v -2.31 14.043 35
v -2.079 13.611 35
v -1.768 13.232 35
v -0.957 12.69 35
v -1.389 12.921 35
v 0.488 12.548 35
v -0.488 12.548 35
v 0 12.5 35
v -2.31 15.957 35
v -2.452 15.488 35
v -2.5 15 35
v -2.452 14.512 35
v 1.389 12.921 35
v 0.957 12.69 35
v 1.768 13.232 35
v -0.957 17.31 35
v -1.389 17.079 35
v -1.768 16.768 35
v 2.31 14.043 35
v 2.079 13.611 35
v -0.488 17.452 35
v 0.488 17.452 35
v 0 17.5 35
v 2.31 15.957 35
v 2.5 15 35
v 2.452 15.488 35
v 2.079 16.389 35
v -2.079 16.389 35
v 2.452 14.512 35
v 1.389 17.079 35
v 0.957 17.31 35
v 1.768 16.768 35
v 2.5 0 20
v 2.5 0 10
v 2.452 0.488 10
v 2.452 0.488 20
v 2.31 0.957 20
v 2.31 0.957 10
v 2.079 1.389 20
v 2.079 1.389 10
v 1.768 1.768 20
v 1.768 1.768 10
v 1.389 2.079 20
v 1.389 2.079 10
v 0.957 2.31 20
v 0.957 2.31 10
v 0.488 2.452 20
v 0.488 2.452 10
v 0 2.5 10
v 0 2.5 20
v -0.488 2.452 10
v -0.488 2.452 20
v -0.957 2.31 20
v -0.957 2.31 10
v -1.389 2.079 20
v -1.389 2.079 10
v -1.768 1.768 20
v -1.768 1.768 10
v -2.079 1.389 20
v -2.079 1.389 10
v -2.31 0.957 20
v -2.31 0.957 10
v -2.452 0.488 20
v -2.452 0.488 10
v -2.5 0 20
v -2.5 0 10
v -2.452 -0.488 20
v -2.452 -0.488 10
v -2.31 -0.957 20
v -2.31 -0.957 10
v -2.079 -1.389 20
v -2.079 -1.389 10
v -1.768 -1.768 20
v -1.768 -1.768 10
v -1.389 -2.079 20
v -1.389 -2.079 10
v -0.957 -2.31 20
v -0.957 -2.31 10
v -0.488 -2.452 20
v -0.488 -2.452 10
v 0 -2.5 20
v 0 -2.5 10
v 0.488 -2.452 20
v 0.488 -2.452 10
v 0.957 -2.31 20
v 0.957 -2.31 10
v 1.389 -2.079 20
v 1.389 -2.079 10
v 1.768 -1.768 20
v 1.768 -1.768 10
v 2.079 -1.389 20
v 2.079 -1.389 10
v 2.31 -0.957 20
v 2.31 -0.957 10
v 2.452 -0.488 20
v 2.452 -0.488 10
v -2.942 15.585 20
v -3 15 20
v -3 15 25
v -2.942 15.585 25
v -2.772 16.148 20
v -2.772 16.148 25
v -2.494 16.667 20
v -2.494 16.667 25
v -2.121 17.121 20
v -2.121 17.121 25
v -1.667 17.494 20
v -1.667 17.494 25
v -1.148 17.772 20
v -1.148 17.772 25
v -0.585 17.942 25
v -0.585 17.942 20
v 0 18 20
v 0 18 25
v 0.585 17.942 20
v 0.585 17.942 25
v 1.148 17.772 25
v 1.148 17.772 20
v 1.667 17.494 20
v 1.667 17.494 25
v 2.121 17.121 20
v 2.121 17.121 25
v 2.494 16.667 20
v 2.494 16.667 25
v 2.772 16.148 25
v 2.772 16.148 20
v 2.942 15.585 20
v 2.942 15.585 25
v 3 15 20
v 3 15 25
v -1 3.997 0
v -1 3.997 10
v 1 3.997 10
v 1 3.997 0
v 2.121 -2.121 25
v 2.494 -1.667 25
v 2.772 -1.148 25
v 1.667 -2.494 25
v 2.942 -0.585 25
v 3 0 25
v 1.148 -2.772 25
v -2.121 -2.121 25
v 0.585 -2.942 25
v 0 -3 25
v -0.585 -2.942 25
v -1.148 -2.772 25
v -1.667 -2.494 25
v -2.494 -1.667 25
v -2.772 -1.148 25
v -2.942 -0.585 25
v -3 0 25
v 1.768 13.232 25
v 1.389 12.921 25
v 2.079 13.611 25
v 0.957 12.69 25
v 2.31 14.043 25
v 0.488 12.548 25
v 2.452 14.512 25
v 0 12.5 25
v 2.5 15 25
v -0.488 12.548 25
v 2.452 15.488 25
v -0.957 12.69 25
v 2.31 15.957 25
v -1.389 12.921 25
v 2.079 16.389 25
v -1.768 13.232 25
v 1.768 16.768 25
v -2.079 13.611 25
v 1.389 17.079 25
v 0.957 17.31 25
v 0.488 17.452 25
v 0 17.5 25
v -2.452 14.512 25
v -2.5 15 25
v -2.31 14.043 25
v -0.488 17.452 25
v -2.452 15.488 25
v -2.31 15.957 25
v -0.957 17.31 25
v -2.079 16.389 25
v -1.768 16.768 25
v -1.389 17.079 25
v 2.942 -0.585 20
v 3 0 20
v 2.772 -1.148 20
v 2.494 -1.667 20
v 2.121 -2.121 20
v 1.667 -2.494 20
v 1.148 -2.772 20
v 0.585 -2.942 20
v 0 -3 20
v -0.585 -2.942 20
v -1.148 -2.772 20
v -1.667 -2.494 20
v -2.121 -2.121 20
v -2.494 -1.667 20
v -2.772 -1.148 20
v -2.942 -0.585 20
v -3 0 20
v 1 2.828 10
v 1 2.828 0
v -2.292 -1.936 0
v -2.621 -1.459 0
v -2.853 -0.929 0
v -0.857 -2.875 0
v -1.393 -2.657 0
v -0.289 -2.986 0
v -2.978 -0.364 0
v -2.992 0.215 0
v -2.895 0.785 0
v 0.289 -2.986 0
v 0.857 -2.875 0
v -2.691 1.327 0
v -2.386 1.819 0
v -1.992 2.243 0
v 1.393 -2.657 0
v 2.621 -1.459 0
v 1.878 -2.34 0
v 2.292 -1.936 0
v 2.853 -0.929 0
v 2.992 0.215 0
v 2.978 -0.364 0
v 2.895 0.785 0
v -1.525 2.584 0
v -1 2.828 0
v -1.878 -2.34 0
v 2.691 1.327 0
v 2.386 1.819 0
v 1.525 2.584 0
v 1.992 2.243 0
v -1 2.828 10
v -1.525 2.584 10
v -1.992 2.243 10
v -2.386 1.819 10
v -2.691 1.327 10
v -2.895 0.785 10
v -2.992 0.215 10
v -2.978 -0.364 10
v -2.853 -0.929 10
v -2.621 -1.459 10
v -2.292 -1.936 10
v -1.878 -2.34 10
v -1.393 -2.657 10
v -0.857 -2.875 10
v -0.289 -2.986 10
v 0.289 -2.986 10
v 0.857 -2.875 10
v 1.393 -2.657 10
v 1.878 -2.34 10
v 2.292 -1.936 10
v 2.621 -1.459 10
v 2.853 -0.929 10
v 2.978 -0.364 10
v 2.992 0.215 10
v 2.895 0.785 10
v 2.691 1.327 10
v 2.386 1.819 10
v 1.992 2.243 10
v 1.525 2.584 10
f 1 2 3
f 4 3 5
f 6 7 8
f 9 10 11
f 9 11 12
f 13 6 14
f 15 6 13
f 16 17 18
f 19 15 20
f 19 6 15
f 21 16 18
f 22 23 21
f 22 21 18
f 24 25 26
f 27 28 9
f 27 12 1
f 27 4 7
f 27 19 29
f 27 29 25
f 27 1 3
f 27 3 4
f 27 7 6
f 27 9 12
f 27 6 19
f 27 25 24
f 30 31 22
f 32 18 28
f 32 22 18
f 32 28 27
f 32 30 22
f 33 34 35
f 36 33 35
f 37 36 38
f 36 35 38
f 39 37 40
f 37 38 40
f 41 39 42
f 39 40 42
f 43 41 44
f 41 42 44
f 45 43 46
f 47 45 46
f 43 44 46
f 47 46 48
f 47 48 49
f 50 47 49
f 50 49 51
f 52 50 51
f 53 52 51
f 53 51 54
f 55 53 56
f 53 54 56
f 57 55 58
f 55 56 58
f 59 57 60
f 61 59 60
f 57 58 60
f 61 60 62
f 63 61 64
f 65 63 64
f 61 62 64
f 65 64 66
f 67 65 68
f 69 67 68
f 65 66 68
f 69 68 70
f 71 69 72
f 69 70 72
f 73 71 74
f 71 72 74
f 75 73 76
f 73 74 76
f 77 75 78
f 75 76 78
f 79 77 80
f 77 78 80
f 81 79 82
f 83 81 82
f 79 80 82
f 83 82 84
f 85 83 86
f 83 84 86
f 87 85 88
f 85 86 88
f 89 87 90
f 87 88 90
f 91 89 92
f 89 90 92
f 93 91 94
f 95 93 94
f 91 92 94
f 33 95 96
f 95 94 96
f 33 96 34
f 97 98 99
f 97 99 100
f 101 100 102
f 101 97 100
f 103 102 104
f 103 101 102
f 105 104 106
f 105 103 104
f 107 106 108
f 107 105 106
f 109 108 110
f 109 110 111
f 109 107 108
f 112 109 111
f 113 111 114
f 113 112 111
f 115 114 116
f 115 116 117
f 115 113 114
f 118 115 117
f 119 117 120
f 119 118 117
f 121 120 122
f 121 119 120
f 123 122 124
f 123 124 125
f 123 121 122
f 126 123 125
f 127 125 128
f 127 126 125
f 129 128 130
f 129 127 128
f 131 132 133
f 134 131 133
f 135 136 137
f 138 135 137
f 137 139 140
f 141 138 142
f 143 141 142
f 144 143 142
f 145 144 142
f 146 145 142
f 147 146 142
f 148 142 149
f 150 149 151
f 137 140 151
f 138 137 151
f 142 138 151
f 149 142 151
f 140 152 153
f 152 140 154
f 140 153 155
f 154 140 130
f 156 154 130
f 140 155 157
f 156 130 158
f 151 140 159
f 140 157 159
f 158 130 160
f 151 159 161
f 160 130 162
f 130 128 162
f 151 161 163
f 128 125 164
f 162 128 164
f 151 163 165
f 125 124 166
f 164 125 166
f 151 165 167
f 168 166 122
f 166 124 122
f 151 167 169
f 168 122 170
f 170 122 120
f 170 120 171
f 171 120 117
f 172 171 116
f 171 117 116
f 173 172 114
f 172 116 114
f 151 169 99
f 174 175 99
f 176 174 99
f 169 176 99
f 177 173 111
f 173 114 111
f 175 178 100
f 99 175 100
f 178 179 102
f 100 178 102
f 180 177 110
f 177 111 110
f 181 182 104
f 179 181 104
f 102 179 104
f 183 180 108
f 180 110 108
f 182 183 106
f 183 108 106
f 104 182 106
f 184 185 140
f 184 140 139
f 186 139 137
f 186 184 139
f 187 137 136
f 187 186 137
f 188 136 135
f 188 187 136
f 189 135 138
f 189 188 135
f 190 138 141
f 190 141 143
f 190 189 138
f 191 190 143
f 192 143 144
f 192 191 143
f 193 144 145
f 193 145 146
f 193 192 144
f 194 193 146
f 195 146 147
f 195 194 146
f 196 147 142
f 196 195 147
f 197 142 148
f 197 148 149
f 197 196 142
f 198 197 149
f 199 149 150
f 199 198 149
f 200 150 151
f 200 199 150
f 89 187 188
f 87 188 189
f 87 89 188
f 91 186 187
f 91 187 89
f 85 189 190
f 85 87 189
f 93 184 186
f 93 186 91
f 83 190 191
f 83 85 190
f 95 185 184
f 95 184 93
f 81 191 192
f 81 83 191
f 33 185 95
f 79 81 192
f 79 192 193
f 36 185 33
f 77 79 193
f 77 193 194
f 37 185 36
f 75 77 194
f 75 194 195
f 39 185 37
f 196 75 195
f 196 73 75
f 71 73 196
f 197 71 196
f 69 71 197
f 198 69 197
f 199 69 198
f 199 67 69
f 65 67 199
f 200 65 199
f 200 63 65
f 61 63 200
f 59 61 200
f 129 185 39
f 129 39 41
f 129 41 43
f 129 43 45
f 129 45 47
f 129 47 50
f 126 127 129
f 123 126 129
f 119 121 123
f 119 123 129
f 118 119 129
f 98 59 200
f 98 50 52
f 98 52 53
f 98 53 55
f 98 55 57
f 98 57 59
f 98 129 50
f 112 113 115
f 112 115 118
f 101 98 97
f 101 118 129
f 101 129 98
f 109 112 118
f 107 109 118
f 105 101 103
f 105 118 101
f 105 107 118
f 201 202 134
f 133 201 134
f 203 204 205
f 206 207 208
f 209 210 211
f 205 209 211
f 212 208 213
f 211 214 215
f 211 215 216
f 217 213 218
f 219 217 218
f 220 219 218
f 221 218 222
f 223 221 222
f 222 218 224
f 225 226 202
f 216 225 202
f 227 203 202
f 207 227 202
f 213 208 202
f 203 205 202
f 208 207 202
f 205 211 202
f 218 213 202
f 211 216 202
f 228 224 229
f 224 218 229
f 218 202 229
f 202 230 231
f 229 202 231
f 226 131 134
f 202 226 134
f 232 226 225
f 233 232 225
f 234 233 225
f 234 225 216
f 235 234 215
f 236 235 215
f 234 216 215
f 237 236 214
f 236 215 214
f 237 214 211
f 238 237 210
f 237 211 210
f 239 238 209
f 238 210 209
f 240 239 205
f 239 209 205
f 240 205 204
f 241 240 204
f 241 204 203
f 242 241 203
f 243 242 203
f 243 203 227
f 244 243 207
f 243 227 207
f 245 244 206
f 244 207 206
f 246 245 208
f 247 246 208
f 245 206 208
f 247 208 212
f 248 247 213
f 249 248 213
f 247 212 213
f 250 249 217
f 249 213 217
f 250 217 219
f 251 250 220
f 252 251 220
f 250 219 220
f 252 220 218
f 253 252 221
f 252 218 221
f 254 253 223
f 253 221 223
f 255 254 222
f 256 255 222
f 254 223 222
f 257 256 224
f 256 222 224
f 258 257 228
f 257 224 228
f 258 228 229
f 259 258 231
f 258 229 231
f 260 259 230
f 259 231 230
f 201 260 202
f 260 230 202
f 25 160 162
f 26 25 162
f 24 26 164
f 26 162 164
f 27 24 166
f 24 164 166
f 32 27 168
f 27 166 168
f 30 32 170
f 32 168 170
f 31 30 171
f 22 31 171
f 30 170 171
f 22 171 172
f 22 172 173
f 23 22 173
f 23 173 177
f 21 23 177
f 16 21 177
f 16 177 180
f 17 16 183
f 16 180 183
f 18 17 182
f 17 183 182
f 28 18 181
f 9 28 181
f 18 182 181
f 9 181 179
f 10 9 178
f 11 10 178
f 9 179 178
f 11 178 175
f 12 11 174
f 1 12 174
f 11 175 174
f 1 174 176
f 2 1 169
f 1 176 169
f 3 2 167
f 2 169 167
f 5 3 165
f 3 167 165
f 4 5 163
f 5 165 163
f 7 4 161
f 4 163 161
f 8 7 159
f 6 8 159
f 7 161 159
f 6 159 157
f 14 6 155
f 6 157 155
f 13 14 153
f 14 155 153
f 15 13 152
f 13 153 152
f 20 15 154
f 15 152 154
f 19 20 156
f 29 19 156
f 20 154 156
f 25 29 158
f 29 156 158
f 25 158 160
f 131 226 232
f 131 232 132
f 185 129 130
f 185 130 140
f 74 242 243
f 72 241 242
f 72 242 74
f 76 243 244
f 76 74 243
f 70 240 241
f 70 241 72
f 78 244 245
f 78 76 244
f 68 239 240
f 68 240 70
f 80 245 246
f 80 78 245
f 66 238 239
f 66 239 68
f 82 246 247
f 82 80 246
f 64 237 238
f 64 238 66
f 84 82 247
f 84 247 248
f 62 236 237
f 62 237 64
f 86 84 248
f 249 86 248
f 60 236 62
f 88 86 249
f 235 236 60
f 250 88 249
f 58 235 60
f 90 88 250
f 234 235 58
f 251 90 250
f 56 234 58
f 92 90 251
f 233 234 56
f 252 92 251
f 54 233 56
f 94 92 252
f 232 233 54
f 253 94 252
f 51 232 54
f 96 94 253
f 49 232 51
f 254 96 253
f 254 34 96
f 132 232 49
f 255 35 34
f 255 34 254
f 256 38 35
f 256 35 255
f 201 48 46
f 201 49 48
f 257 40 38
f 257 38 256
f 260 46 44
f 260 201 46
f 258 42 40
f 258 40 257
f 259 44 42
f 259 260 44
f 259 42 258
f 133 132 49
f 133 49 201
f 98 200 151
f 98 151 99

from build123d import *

# Parameters (mm, degrees)
SKETCH1_R           = 3
SKETCH1_W           = 2
SKETCH1_H           = 1.993597438
BOSS_EXTRUDE1_DEPTH = 10
SKETCH2_R           = 2.5
BOSS_EXTRUDE2_DEPTH = 10
BOSS_EXTRUDE3_DEPTH = 5
SKETCH4_R           = 2.5
BOSS_EXTRUDE4_DEPTH = 10


with BuildPart() as part:
    # Sketch1 → Boss-Extrude1 (new body)
    with BuildSketch(Plane.XY):
        Circle(SKETCH1_R)
        with Locations((0, 3)):
            Rectangle(SKETCH1_W, SKETCH1_H)
    extrude(amount=BOSS_EXTRUDE1_DEPTH)

    # Sketch2 → Boss-Extrude2 (add)
    with BuildSketch(Plane.XY.offset(10)):
        Circle(SKETCH2_R)
    extrude(amount=BOSS_EXTRUDE2_DEPTH)

    # Sketch3 → Boss-Extrude3 (add)
    with BuildSketch(Plane.XY.offset(20)):
        with BuildLine():
            Line((-3, 0), (-3, 15))
            ThreePointArc((-3, 15), (0, 18), (3, 15))
            Line((3, 15), (3, 0))
            ThreePointArc((3, 0), (0, -3), (-3, 0))
        make_face()
    extrude(amount=BOSS_EXTRUDE3_DEPTH)

    # Sketch4 → Boss-Extrude4 (add)
    with BuildSketch(Plane.XY.offset(25)):
        with Locations((0, 15)):
            Circle(SKETCH4_R)
    extrude(amount=BOSS_EXTRUDE4_DEPTH)


solid = part.part
